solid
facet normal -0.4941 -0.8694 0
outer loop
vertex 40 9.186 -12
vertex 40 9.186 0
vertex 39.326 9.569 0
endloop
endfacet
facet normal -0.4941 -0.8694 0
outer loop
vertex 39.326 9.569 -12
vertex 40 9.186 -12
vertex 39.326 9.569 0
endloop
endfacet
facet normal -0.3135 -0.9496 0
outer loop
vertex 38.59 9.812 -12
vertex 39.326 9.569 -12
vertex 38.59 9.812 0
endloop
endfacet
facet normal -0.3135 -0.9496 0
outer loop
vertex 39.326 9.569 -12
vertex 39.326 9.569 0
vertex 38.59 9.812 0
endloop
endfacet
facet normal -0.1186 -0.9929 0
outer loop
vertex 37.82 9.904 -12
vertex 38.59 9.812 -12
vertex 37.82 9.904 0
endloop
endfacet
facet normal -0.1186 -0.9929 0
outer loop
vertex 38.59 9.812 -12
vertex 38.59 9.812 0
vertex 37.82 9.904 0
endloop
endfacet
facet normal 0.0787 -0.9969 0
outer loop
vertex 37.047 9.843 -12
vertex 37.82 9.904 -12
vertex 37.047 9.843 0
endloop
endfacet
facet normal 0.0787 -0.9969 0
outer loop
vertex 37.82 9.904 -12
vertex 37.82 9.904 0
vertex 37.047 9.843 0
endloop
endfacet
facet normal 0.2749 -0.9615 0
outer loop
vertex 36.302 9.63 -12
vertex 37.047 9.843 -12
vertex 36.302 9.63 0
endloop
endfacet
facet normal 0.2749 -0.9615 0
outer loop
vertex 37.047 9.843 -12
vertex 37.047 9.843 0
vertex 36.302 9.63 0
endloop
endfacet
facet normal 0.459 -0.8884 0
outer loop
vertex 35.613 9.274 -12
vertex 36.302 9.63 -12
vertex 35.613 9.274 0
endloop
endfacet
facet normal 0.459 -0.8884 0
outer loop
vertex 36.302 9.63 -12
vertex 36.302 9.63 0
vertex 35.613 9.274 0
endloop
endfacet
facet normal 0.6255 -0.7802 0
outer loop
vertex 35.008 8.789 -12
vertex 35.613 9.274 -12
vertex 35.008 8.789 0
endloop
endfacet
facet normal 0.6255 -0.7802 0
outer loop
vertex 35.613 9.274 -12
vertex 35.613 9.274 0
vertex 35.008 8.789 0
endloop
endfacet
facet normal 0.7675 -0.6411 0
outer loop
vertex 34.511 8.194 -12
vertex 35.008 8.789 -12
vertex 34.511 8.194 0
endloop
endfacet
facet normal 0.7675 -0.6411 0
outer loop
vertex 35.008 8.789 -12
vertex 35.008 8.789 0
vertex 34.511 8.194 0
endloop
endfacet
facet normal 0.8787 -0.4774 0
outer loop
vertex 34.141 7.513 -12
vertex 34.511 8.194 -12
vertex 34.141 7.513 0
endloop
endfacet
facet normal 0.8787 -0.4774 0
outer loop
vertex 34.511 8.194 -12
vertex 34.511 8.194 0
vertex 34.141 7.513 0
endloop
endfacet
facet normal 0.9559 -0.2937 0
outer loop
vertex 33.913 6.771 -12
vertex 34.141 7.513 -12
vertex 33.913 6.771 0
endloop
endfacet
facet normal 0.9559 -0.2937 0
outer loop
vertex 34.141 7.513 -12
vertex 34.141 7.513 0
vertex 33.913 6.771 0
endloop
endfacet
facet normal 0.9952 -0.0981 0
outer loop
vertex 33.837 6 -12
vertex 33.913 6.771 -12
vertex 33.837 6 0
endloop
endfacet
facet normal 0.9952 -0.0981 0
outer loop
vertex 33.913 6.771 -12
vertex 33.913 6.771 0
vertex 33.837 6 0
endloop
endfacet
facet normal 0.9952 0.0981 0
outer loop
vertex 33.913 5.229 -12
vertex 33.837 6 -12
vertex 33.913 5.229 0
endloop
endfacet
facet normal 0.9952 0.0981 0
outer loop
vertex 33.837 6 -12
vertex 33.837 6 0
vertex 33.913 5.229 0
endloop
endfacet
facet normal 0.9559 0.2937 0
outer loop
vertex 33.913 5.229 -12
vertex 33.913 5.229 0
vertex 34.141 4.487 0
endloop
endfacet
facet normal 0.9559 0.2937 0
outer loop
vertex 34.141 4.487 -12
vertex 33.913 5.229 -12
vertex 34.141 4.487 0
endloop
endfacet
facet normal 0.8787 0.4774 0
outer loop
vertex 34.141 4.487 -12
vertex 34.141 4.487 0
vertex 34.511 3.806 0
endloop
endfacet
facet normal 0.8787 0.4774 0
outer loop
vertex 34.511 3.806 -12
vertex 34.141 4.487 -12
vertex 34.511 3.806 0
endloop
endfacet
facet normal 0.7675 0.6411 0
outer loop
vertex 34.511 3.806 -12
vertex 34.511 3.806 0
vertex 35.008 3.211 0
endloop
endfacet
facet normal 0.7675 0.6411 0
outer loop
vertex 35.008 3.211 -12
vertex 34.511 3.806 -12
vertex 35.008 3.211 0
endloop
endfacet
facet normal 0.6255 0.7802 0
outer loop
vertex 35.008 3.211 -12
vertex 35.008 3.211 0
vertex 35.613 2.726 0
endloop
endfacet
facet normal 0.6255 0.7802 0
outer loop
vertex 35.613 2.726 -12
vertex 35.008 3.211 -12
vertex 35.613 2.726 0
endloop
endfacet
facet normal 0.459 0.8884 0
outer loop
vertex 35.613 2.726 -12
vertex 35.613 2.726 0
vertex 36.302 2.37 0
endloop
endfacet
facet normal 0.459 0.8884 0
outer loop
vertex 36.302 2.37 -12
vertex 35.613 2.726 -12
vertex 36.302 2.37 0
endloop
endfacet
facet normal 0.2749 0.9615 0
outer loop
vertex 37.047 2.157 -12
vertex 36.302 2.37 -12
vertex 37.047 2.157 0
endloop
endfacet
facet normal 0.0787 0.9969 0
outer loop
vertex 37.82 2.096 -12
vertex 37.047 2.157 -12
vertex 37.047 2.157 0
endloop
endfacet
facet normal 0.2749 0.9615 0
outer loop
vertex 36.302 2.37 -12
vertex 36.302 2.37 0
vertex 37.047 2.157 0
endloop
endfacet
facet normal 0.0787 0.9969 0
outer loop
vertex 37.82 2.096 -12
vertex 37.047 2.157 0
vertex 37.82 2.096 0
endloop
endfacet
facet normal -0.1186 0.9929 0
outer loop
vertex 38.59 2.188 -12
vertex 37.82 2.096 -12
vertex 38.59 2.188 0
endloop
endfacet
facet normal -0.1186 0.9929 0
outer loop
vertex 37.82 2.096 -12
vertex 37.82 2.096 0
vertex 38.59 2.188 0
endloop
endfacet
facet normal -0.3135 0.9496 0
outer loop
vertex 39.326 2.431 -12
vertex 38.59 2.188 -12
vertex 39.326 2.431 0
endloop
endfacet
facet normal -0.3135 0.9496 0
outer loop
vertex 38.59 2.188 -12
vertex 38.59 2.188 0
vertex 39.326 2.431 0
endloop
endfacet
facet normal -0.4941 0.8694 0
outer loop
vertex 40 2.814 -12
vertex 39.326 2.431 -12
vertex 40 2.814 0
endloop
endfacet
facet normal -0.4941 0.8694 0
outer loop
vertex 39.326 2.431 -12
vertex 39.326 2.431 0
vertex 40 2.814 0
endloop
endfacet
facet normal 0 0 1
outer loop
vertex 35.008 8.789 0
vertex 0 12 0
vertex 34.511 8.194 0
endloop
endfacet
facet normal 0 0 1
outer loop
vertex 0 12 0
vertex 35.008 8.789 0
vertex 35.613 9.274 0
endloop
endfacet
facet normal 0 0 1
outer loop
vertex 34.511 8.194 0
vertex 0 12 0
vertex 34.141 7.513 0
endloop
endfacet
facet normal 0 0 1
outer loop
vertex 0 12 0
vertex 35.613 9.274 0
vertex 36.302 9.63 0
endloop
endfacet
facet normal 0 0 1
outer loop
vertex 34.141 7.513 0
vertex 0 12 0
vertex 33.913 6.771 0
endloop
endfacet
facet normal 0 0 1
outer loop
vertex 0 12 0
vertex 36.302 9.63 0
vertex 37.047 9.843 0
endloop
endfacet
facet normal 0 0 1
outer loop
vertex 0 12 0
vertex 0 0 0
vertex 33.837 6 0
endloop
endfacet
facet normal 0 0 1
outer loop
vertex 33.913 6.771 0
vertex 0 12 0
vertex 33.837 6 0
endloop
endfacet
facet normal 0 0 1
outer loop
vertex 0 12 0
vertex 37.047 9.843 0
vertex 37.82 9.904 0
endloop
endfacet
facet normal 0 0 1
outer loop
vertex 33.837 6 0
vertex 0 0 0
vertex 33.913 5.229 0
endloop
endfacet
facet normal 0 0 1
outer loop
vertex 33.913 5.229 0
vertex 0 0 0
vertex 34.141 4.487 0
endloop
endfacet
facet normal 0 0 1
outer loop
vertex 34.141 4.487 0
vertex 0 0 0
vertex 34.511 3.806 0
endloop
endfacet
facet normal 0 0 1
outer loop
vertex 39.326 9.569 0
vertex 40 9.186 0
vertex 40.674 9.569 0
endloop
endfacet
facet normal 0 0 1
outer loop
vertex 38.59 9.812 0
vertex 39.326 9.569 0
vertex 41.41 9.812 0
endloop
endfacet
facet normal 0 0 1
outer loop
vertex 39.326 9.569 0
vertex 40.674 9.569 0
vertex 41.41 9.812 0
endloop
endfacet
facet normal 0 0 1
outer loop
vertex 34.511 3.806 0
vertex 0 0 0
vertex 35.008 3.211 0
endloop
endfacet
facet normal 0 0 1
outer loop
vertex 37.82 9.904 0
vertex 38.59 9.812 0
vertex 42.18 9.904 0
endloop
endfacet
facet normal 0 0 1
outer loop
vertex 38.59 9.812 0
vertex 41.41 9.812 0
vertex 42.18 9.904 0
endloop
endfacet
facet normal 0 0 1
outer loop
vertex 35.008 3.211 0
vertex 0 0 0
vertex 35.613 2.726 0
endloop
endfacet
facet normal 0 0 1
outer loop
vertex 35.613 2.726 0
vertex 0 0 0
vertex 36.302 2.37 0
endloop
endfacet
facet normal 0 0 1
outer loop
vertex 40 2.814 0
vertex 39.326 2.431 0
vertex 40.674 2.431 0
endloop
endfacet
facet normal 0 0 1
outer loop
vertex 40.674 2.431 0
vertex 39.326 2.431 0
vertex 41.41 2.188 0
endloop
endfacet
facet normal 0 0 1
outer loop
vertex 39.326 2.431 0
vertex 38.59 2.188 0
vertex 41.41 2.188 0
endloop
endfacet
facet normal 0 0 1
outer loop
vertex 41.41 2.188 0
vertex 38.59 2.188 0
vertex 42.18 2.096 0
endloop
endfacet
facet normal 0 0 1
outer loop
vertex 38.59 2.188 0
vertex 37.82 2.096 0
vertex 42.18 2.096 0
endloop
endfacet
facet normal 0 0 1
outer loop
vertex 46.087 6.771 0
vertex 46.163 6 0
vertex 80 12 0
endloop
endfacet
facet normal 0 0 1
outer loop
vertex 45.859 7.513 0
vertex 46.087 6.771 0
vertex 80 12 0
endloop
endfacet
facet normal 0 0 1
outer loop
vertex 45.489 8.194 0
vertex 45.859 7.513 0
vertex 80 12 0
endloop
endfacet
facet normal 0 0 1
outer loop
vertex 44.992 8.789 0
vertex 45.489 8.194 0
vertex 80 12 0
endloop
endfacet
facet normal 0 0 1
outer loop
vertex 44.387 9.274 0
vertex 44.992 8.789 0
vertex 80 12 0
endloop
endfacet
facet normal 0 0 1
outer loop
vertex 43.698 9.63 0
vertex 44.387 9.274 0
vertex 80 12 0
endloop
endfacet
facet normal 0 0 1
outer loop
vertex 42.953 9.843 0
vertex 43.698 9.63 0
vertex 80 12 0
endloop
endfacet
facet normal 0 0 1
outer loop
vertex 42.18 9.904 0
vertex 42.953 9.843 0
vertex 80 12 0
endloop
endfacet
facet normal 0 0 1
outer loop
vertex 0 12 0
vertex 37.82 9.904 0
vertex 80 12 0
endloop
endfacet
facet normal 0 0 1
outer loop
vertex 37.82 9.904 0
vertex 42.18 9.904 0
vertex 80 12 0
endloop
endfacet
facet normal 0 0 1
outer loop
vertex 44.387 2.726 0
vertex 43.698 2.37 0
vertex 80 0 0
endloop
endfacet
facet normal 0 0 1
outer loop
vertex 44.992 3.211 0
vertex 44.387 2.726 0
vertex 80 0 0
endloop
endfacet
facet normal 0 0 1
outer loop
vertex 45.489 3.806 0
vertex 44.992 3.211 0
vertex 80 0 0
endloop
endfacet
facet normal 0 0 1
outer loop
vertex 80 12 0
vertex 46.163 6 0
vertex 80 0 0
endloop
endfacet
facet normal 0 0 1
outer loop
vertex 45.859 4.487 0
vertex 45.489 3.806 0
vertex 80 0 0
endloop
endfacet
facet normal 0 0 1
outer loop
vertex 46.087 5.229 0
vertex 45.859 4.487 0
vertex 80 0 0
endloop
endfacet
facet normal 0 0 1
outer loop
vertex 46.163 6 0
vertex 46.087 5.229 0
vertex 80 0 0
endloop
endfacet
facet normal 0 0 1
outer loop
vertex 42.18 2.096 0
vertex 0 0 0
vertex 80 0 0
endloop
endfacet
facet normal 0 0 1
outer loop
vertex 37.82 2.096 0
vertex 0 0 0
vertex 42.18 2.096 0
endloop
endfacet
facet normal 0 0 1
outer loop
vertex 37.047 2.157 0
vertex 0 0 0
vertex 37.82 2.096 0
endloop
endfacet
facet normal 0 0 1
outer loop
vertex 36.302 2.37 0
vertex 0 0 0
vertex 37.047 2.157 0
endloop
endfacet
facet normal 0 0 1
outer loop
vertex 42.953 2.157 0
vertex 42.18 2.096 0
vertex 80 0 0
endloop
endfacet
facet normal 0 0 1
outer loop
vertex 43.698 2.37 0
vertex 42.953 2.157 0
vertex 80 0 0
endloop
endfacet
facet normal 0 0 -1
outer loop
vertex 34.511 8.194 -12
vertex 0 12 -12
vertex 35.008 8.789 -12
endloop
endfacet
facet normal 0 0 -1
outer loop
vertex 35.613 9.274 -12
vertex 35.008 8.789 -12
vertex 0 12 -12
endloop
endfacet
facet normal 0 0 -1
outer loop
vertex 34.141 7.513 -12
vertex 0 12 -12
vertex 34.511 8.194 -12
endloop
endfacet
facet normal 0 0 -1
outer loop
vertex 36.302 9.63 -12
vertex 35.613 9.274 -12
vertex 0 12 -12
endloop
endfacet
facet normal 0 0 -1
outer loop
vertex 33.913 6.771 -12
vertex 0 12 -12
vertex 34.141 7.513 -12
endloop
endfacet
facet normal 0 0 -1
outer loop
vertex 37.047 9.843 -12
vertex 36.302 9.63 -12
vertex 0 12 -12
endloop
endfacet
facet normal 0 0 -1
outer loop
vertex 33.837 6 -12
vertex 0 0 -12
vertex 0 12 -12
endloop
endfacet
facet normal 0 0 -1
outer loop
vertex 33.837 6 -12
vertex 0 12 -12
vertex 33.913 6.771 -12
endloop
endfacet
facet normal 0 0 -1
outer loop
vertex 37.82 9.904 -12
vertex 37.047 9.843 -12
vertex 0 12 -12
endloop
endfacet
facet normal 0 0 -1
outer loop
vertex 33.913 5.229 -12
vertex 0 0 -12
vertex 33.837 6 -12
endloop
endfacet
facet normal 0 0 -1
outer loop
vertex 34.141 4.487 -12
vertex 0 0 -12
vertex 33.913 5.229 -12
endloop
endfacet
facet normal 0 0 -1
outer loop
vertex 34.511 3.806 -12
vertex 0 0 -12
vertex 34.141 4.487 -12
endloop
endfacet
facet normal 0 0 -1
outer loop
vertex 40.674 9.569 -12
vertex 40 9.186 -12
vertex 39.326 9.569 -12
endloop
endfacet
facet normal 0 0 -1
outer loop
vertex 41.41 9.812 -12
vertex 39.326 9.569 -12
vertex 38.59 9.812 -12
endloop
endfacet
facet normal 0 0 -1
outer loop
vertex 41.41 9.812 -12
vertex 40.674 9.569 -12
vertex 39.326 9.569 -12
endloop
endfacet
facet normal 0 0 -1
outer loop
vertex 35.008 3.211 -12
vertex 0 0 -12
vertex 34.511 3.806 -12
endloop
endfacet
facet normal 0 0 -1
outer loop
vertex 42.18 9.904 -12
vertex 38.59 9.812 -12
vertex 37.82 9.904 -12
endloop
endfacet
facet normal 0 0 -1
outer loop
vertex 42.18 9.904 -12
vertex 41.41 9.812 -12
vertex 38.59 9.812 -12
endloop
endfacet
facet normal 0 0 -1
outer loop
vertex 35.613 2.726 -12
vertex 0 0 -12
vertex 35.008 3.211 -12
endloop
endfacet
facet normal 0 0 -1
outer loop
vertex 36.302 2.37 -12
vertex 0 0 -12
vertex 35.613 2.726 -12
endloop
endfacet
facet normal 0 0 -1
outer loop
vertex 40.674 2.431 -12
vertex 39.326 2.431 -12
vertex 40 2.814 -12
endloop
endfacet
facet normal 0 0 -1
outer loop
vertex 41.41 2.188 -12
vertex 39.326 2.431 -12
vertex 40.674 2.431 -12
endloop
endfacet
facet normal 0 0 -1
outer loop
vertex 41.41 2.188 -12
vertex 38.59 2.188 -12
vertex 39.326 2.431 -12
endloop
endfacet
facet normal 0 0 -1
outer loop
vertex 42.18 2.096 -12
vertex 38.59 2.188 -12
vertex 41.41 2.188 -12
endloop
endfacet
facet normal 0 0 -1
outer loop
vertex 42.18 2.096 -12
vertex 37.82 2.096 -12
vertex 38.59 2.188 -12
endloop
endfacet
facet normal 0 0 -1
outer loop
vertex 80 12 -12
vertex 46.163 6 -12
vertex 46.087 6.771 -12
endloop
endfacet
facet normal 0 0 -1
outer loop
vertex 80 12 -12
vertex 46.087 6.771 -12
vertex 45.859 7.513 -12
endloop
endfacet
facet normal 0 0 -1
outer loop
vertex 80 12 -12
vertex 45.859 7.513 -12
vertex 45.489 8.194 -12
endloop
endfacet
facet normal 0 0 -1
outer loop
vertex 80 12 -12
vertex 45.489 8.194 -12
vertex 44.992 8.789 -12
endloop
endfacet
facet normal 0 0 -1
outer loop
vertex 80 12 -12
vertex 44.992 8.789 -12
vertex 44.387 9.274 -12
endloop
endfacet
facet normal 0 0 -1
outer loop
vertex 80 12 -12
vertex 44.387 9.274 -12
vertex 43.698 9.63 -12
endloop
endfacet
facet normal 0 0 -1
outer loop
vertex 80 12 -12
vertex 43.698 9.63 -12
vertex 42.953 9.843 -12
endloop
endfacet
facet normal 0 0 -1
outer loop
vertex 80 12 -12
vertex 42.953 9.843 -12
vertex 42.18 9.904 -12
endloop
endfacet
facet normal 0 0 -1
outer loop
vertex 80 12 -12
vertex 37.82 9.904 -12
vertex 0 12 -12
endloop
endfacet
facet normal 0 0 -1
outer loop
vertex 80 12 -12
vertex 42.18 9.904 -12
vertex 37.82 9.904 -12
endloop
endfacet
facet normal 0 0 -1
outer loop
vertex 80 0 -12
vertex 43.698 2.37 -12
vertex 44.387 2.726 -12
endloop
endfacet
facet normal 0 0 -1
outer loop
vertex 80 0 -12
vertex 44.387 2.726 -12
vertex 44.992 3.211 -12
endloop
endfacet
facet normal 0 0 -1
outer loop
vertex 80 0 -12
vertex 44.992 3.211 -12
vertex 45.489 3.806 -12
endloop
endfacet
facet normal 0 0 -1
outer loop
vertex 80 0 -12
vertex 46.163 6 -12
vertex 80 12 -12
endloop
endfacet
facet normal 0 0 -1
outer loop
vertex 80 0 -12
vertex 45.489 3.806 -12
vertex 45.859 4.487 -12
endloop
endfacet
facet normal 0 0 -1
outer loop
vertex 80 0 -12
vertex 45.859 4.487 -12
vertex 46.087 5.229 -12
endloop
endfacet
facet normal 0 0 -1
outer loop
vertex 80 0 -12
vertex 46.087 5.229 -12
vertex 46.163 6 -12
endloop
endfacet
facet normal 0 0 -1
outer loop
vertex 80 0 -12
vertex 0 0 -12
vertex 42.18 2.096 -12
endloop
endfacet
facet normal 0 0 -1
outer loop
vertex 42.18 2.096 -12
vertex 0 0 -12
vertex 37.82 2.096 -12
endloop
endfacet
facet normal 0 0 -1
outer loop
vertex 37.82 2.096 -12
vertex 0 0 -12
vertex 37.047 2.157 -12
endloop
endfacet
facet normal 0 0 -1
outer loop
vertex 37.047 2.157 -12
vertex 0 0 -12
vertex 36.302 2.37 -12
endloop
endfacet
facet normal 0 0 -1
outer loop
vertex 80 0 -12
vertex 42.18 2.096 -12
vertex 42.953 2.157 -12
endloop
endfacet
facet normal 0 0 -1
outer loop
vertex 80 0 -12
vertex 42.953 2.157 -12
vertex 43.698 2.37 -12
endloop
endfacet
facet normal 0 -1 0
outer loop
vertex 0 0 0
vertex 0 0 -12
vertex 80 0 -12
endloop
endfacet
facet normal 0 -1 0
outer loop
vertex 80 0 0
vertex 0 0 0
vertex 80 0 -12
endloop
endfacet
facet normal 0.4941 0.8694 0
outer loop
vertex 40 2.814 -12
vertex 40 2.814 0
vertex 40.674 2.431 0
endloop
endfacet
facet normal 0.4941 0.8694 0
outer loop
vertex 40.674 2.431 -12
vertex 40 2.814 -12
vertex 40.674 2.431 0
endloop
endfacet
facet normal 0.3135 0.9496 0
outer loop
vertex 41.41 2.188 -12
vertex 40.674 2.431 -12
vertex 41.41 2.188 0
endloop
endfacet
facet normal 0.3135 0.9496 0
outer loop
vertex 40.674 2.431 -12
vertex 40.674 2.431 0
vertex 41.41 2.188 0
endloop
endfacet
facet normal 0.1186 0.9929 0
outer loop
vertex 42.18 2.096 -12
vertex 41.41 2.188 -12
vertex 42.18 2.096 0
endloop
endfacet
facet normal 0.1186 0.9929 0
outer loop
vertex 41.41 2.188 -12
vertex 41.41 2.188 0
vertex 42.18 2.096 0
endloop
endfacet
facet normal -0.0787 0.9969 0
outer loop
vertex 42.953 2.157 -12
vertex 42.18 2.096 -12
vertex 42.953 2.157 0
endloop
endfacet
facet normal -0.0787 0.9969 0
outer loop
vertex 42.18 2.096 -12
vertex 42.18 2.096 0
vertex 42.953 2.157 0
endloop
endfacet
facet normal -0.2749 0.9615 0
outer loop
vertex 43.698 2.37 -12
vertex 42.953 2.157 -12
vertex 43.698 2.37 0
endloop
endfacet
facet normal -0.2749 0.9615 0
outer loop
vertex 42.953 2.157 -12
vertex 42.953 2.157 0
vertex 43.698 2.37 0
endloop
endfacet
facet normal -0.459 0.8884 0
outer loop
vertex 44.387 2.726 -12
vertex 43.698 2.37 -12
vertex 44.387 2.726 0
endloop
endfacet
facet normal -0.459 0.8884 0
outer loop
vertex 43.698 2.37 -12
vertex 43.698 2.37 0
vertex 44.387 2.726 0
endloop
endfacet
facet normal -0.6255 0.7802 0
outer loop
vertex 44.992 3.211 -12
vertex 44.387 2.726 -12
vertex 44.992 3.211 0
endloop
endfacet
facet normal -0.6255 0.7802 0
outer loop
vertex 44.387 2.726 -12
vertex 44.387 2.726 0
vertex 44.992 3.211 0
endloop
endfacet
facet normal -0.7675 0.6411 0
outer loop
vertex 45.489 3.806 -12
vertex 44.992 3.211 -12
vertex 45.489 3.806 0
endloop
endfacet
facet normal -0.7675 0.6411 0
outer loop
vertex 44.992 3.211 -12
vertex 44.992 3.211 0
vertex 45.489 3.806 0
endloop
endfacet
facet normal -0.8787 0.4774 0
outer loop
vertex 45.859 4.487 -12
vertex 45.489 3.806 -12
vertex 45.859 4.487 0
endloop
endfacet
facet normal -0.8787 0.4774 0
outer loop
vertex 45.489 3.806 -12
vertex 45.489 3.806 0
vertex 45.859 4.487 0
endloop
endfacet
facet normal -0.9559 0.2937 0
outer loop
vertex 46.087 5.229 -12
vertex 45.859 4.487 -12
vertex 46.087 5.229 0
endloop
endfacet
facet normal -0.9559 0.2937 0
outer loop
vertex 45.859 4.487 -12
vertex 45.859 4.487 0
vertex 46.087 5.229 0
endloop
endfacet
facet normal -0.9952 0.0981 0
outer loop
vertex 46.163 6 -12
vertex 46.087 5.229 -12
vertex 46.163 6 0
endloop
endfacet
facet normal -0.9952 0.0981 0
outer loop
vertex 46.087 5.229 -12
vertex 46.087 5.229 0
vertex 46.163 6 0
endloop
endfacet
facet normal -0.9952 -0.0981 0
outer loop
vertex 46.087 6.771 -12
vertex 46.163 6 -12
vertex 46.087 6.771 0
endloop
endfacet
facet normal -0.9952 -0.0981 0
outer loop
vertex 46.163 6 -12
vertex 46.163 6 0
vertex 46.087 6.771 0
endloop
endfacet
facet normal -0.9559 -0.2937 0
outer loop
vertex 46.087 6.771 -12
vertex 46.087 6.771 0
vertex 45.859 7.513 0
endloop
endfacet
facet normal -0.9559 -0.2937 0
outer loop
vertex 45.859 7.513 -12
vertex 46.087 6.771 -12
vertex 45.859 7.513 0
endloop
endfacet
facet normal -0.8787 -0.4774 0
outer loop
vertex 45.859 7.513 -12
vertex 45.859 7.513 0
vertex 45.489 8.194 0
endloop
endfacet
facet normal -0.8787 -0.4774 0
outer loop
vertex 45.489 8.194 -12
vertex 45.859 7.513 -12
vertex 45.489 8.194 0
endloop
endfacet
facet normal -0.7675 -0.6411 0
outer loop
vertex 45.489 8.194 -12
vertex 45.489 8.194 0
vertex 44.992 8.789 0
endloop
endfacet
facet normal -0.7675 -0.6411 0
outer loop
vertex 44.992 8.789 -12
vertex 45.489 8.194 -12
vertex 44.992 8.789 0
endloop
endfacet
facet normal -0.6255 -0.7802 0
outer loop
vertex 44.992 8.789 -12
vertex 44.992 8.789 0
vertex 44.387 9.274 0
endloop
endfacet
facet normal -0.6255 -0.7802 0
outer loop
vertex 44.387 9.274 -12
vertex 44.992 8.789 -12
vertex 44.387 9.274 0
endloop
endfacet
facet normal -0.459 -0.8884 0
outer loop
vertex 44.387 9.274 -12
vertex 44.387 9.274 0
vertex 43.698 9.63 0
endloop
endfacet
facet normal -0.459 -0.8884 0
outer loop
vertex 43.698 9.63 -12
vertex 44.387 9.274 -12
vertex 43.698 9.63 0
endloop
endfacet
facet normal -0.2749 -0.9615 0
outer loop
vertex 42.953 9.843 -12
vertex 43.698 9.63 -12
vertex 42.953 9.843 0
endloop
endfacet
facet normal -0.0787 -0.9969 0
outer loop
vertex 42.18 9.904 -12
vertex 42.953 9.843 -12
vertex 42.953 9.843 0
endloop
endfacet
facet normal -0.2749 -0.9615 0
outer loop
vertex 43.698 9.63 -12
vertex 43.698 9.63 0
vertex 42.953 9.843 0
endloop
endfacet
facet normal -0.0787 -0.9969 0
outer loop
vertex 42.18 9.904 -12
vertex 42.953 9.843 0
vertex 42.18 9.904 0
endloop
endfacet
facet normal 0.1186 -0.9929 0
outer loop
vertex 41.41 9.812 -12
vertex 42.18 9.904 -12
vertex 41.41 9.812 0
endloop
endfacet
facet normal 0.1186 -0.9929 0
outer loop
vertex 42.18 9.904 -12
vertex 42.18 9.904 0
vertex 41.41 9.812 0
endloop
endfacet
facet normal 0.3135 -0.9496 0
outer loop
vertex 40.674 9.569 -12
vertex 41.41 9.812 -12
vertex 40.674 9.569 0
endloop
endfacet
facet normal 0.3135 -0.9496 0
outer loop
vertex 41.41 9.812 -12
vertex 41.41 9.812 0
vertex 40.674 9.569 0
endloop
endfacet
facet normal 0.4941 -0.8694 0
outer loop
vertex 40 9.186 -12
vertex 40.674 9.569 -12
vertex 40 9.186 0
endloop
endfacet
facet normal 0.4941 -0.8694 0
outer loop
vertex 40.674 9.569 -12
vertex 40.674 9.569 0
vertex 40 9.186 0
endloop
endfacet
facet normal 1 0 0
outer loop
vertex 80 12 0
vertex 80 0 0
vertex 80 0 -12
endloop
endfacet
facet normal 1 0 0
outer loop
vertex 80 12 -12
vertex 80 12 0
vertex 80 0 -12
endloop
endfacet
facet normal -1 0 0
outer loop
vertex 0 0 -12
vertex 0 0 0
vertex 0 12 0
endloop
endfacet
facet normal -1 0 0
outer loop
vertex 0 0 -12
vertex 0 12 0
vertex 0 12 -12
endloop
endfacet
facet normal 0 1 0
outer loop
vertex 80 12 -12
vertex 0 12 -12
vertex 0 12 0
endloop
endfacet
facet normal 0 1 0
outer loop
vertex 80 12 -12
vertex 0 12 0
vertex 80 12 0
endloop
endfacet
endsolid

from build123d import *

# Parameters (mm, degrees)
CROQUIS1_W              = 80
CROQUIS1_H              = 12
SALIENTE_EXTRUIR1_DEPTH = 12
CORTAR_EXTRUIR1_DEPTH   = 12


with BuildPart() as part:
    # Croquis1 → Saliente-Extruir1 (new body)
    with BuildSketch(Plane(origin=(0, 0, 0), x_dir=(1, 0, 0), z_dir=(0, 1, 0))):
        with Locations((40, 6)):
            Rectangle(CROQUIS1_W, CROQUIS1_H)
    extrude(amount=SALIENTE_EXTRUIR1_DEPTH)

    # Croquis2 → Cortar-Extruir1 (cut)
    with BuildSketch(Plane.XY):
        with BuildLine():
            ThreePointArc((40, 2.81412174), (46.163496931, 6), (40, 9.18587826))
            ThreePointArc((40, 9.18587826), (33.836503069, 6), (40, 2.81412174))
        make_face()
    extrude(amount=-CORTAR_EXTRUIR1_DEPTH, mode=Mode.SUBTRACT)


solid = part.part
